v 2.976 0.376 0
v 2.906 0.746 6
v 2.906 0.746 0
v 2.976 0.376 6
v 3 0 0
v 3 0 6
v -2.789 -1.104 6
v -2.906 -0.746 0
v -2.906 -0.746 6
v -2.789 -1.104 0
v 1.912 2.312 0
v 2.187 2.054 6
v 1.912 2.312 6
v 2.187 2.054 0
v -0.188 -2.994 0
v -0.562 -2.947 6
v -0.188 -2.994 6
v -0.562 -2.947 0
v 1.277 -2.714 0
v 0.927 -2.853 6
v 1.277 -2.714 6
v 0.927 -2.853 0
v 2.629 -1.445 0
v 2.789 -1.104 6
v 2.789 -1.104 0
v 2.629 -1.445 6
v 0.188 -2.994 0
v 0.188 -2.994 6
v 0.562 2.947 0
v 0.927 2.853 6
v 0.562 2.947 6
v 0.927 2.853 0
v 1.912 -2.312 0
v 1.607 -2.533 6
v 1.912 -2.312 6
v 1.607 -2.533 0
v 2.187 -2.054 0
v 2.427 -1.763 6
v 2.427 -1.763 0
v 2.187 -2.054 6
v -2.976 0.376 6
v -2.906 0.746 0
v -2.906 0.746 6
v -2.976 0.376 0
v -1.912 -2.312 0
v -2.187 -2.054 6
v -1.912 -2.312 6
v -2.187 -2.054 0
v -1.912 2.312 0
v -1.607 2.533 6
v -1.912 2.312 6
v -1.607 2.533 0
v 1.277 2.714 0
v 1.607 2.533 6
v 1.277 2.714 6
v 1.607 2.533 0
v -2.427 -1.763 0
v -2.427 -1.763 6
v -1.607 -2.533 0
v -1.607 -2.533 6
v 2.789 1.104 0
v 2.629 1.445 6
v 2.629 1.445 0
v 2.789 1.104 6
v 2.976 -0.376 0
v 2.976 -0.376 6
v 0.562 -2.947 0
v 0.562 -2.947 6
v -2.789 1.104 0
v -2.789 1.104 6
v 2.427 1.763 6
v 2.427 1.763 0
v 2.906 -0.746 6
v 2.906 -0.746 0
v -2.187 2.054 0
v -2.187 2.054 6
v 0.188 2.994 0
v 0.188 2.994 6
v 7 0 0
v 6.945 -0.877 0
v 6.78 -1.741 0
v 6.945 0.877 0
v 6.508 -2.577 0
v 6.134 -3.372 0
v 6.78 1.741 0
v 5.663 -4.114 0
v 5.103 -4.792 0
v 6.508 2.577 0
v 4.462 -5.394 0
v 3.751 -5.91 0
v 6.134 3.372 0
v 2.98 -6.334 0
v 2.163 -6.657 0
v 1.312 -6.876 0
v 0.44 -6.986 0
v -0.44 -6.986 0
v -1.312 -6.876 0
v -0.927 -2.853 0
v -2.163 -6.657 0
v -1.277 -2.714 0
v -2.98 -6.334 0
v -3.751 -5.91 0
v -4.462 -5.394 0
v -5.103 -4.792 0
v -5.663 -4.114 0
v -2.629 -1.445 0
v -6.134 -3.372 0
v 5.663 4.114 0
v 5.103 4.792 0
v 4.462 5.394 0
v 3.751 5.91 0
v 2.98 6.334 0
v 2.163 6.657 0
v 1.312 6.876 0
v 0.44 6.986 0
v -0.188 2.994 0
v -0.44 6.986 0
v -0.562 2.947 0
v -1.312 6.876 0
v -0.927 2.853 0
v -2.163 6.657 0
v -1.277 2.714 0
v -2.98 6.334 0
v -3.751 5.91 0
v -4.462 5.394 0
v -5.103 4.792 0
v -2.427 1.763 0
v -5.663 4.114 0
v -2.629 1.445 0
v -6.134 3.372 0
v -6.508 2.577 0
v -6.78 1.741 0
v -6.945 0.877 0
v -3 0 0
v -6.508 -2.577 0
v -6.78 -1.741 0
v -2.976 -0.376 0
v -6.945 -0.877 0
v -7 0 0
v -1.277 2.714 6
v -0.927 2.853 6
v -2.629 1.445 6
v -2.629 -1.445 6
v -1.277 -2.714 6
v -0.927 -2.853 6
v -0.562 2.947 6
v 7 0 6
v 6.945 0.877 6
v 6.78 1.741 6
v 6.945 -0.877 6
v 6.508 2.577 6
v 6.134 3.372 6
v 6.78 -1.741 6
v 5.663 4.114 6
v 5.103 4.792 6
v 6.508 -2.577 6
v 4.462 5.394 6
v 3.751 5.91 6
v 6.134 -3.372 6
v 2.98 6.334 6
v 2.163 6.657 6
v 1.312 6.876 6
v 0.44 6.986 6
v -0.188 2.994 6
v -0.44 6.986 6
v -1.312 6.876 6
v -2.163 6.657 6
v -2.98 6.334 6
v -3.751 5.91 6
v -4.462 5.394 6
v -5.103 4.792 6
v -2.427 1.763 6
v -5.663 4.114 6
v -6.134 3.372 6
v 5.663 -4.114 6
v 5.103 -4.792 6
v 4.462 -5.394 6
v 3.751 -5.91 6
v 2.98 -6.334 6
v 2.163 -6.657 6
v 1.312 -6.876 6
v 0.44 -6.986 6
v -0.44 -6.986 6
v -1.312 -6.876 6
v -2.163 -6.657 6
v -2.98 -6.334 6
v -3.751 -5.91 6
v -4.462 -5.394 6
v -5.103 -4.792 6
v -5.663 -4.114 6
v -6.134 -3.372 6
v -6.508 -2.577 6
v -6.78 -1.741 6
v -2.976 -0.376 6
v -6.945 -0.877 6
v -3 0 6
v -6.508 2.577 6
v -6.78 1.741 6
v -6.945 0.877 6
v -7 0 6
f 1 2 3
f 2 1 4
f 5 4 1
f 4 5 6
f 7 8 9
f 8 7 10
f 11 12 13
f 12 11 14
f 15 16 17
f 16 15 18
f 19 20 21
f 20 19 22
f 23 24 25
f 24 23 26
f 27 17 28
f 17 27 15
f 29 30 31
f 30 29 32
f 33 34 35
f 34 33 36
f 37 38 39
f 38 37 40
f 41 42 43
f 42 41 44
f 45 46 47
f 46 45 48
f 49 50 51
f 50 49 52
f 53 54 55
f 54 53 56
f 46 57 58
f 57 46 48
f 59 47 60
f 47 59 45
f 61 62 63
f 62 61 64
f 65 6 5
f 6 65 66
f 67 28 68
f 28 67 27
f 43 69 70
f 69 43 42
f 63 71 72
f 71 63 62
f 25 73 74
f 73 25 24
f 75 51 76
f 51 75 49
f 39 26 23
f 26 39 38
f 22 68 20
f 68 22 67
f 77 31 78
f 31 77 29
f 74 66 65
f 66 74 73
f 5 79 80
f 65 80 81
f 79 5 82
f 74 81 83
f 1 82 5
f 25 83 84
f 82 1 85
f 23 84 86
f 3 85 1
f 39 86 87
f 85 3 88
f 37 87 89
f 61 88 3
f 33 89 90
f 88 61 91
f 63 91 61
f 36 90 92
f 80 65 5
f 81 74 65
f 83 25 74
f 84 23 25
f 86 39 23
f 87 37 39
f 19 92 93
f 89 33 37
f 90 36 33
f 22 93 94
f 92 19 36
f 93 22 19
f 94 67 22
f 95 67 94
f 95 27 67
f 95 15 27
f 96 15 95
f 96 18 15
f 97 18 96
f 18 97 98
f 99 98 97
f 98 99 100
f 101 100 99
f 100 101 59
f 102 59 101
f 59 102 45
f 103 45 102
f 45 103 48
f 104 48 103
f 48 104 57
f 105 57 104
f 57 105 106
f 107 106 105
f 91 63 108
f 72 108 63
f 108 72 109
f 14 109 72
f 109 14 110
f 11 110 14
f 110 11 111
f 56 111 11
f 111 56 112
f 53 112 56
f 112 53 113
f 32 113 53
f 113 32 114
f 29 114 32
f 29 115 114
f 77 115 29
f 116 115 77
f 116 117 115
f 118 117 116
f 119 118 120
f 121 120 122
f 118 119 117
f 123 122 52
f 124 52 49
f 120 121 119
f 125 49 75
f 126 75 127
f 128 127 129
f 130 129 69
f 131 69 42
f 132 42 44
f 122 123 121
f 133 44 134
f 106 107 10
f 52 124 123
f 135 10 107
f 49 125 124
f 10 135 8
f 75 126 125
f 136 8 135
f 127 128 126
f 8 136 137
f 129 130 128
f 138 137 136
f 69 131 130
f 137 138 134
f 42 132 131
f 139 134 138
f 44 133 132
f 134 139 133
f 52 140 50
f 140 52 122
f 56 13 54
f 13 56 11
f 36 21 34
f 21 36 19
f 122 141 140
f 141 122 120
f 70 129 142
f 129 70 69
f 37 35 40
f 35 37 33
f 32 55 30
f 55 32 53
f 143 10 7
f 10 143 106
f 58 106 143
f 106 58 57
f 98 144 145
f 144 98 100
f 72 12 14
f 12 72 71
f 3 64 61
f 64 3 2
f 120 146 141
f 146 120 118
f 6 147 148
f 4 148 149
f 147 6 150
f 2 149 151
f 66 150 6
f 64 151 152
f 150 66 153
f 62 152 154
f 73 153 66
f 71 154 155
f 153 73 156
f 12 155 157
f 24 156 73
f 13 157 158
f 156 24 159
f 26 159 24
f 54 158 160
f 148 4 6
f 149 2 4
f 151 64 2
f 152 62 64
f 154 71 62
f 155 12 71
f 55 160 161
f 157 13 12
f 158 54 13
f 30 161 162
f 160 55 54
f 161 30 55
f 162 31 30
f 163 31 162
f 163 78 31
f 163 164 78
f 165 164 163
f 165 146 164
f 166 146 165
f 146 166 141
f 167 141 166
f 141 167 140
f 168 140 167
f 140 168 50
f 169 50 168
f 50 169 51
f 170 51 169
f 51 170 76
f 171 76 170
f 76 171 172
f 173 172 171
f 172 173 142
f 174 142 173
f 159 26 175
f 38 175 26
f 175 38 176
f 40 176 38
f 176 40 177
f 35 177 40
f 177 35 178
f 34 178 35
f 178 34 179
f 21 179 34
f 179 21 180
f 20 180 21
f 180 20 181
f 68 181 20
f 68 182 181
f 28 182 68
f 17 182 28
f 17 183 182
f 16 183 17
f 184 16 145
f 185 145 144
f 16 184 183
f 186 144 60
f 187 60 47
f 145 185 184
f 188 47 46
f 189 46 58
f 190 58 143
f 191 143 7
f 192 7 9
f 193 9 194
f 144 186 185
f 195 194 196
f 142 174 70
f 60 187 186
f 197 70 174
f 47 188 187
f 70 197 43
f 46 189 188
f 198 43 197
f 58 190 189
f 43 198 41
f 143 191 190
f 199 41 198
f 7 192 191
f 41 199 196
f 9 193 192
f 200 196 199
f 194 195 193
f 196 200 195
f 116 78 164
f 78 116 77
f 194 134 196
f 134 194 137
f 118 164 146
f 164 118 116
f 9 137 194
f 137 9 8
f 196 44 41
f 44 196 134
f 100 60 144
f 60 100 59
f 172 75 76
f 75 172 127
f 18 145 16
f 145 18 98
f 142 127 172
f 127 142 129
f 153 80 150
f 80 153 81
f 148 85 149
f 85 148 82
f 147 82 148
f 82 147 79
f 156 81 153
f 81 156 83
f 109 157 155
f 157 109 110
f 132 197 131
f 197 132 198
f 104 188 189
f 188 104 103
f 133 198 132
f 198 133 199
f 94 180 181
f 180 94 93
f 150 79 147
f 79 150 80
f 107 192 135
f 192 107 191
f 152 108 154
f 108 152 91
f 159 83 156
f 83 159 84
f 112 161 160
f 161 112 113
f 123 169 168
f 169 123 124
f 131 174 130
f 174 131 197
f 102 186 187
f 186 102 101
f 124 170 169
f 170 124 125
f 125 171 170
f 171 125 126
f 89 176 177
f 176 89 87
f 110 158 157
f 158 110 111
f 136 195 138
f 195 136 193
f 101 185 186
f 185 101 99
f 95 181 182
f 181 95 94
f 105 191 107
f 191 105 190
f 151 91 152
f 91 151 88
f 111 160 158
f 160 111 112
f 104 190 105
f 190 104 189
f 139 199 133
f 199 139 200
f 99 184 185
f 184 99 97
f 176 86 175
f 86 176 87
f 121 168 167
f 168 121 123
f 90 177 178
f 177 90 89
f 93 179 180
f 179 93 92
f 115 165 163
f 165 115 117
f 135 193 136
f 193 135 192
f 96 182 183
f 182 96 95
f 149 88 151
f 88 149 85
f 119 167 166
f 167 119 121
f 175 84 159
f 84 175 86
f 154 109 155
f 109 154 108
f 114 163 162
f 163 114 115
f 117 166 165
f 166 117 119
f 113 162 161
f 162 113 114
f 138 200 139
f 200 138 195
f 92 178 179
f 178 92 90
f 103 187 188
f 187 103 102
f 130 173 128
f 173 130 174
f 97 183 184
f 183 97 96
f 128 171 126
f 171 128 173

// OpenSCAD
$fn = 50;


difference() {
	union() {
		cylinder(h = 6, r = 7.0000000000);
	}
	union() {
		cylinder(h = 6, r = 3.0000000000);
		cylinder(h = 6, r = 3.0000000000);
		cylinder(h = 6, r = 1.5000000000);
		cylinder(h = 6, r = 1.5000000000);
		cylinder(h = 6, r = 1.5000000000);
		cylinder(h = 6, r = 1.5000000000);
		cylinder(h = 6, r = 1.5000000000);
		cylinder(h = 6, r = 1.5000000000);
	}
}
